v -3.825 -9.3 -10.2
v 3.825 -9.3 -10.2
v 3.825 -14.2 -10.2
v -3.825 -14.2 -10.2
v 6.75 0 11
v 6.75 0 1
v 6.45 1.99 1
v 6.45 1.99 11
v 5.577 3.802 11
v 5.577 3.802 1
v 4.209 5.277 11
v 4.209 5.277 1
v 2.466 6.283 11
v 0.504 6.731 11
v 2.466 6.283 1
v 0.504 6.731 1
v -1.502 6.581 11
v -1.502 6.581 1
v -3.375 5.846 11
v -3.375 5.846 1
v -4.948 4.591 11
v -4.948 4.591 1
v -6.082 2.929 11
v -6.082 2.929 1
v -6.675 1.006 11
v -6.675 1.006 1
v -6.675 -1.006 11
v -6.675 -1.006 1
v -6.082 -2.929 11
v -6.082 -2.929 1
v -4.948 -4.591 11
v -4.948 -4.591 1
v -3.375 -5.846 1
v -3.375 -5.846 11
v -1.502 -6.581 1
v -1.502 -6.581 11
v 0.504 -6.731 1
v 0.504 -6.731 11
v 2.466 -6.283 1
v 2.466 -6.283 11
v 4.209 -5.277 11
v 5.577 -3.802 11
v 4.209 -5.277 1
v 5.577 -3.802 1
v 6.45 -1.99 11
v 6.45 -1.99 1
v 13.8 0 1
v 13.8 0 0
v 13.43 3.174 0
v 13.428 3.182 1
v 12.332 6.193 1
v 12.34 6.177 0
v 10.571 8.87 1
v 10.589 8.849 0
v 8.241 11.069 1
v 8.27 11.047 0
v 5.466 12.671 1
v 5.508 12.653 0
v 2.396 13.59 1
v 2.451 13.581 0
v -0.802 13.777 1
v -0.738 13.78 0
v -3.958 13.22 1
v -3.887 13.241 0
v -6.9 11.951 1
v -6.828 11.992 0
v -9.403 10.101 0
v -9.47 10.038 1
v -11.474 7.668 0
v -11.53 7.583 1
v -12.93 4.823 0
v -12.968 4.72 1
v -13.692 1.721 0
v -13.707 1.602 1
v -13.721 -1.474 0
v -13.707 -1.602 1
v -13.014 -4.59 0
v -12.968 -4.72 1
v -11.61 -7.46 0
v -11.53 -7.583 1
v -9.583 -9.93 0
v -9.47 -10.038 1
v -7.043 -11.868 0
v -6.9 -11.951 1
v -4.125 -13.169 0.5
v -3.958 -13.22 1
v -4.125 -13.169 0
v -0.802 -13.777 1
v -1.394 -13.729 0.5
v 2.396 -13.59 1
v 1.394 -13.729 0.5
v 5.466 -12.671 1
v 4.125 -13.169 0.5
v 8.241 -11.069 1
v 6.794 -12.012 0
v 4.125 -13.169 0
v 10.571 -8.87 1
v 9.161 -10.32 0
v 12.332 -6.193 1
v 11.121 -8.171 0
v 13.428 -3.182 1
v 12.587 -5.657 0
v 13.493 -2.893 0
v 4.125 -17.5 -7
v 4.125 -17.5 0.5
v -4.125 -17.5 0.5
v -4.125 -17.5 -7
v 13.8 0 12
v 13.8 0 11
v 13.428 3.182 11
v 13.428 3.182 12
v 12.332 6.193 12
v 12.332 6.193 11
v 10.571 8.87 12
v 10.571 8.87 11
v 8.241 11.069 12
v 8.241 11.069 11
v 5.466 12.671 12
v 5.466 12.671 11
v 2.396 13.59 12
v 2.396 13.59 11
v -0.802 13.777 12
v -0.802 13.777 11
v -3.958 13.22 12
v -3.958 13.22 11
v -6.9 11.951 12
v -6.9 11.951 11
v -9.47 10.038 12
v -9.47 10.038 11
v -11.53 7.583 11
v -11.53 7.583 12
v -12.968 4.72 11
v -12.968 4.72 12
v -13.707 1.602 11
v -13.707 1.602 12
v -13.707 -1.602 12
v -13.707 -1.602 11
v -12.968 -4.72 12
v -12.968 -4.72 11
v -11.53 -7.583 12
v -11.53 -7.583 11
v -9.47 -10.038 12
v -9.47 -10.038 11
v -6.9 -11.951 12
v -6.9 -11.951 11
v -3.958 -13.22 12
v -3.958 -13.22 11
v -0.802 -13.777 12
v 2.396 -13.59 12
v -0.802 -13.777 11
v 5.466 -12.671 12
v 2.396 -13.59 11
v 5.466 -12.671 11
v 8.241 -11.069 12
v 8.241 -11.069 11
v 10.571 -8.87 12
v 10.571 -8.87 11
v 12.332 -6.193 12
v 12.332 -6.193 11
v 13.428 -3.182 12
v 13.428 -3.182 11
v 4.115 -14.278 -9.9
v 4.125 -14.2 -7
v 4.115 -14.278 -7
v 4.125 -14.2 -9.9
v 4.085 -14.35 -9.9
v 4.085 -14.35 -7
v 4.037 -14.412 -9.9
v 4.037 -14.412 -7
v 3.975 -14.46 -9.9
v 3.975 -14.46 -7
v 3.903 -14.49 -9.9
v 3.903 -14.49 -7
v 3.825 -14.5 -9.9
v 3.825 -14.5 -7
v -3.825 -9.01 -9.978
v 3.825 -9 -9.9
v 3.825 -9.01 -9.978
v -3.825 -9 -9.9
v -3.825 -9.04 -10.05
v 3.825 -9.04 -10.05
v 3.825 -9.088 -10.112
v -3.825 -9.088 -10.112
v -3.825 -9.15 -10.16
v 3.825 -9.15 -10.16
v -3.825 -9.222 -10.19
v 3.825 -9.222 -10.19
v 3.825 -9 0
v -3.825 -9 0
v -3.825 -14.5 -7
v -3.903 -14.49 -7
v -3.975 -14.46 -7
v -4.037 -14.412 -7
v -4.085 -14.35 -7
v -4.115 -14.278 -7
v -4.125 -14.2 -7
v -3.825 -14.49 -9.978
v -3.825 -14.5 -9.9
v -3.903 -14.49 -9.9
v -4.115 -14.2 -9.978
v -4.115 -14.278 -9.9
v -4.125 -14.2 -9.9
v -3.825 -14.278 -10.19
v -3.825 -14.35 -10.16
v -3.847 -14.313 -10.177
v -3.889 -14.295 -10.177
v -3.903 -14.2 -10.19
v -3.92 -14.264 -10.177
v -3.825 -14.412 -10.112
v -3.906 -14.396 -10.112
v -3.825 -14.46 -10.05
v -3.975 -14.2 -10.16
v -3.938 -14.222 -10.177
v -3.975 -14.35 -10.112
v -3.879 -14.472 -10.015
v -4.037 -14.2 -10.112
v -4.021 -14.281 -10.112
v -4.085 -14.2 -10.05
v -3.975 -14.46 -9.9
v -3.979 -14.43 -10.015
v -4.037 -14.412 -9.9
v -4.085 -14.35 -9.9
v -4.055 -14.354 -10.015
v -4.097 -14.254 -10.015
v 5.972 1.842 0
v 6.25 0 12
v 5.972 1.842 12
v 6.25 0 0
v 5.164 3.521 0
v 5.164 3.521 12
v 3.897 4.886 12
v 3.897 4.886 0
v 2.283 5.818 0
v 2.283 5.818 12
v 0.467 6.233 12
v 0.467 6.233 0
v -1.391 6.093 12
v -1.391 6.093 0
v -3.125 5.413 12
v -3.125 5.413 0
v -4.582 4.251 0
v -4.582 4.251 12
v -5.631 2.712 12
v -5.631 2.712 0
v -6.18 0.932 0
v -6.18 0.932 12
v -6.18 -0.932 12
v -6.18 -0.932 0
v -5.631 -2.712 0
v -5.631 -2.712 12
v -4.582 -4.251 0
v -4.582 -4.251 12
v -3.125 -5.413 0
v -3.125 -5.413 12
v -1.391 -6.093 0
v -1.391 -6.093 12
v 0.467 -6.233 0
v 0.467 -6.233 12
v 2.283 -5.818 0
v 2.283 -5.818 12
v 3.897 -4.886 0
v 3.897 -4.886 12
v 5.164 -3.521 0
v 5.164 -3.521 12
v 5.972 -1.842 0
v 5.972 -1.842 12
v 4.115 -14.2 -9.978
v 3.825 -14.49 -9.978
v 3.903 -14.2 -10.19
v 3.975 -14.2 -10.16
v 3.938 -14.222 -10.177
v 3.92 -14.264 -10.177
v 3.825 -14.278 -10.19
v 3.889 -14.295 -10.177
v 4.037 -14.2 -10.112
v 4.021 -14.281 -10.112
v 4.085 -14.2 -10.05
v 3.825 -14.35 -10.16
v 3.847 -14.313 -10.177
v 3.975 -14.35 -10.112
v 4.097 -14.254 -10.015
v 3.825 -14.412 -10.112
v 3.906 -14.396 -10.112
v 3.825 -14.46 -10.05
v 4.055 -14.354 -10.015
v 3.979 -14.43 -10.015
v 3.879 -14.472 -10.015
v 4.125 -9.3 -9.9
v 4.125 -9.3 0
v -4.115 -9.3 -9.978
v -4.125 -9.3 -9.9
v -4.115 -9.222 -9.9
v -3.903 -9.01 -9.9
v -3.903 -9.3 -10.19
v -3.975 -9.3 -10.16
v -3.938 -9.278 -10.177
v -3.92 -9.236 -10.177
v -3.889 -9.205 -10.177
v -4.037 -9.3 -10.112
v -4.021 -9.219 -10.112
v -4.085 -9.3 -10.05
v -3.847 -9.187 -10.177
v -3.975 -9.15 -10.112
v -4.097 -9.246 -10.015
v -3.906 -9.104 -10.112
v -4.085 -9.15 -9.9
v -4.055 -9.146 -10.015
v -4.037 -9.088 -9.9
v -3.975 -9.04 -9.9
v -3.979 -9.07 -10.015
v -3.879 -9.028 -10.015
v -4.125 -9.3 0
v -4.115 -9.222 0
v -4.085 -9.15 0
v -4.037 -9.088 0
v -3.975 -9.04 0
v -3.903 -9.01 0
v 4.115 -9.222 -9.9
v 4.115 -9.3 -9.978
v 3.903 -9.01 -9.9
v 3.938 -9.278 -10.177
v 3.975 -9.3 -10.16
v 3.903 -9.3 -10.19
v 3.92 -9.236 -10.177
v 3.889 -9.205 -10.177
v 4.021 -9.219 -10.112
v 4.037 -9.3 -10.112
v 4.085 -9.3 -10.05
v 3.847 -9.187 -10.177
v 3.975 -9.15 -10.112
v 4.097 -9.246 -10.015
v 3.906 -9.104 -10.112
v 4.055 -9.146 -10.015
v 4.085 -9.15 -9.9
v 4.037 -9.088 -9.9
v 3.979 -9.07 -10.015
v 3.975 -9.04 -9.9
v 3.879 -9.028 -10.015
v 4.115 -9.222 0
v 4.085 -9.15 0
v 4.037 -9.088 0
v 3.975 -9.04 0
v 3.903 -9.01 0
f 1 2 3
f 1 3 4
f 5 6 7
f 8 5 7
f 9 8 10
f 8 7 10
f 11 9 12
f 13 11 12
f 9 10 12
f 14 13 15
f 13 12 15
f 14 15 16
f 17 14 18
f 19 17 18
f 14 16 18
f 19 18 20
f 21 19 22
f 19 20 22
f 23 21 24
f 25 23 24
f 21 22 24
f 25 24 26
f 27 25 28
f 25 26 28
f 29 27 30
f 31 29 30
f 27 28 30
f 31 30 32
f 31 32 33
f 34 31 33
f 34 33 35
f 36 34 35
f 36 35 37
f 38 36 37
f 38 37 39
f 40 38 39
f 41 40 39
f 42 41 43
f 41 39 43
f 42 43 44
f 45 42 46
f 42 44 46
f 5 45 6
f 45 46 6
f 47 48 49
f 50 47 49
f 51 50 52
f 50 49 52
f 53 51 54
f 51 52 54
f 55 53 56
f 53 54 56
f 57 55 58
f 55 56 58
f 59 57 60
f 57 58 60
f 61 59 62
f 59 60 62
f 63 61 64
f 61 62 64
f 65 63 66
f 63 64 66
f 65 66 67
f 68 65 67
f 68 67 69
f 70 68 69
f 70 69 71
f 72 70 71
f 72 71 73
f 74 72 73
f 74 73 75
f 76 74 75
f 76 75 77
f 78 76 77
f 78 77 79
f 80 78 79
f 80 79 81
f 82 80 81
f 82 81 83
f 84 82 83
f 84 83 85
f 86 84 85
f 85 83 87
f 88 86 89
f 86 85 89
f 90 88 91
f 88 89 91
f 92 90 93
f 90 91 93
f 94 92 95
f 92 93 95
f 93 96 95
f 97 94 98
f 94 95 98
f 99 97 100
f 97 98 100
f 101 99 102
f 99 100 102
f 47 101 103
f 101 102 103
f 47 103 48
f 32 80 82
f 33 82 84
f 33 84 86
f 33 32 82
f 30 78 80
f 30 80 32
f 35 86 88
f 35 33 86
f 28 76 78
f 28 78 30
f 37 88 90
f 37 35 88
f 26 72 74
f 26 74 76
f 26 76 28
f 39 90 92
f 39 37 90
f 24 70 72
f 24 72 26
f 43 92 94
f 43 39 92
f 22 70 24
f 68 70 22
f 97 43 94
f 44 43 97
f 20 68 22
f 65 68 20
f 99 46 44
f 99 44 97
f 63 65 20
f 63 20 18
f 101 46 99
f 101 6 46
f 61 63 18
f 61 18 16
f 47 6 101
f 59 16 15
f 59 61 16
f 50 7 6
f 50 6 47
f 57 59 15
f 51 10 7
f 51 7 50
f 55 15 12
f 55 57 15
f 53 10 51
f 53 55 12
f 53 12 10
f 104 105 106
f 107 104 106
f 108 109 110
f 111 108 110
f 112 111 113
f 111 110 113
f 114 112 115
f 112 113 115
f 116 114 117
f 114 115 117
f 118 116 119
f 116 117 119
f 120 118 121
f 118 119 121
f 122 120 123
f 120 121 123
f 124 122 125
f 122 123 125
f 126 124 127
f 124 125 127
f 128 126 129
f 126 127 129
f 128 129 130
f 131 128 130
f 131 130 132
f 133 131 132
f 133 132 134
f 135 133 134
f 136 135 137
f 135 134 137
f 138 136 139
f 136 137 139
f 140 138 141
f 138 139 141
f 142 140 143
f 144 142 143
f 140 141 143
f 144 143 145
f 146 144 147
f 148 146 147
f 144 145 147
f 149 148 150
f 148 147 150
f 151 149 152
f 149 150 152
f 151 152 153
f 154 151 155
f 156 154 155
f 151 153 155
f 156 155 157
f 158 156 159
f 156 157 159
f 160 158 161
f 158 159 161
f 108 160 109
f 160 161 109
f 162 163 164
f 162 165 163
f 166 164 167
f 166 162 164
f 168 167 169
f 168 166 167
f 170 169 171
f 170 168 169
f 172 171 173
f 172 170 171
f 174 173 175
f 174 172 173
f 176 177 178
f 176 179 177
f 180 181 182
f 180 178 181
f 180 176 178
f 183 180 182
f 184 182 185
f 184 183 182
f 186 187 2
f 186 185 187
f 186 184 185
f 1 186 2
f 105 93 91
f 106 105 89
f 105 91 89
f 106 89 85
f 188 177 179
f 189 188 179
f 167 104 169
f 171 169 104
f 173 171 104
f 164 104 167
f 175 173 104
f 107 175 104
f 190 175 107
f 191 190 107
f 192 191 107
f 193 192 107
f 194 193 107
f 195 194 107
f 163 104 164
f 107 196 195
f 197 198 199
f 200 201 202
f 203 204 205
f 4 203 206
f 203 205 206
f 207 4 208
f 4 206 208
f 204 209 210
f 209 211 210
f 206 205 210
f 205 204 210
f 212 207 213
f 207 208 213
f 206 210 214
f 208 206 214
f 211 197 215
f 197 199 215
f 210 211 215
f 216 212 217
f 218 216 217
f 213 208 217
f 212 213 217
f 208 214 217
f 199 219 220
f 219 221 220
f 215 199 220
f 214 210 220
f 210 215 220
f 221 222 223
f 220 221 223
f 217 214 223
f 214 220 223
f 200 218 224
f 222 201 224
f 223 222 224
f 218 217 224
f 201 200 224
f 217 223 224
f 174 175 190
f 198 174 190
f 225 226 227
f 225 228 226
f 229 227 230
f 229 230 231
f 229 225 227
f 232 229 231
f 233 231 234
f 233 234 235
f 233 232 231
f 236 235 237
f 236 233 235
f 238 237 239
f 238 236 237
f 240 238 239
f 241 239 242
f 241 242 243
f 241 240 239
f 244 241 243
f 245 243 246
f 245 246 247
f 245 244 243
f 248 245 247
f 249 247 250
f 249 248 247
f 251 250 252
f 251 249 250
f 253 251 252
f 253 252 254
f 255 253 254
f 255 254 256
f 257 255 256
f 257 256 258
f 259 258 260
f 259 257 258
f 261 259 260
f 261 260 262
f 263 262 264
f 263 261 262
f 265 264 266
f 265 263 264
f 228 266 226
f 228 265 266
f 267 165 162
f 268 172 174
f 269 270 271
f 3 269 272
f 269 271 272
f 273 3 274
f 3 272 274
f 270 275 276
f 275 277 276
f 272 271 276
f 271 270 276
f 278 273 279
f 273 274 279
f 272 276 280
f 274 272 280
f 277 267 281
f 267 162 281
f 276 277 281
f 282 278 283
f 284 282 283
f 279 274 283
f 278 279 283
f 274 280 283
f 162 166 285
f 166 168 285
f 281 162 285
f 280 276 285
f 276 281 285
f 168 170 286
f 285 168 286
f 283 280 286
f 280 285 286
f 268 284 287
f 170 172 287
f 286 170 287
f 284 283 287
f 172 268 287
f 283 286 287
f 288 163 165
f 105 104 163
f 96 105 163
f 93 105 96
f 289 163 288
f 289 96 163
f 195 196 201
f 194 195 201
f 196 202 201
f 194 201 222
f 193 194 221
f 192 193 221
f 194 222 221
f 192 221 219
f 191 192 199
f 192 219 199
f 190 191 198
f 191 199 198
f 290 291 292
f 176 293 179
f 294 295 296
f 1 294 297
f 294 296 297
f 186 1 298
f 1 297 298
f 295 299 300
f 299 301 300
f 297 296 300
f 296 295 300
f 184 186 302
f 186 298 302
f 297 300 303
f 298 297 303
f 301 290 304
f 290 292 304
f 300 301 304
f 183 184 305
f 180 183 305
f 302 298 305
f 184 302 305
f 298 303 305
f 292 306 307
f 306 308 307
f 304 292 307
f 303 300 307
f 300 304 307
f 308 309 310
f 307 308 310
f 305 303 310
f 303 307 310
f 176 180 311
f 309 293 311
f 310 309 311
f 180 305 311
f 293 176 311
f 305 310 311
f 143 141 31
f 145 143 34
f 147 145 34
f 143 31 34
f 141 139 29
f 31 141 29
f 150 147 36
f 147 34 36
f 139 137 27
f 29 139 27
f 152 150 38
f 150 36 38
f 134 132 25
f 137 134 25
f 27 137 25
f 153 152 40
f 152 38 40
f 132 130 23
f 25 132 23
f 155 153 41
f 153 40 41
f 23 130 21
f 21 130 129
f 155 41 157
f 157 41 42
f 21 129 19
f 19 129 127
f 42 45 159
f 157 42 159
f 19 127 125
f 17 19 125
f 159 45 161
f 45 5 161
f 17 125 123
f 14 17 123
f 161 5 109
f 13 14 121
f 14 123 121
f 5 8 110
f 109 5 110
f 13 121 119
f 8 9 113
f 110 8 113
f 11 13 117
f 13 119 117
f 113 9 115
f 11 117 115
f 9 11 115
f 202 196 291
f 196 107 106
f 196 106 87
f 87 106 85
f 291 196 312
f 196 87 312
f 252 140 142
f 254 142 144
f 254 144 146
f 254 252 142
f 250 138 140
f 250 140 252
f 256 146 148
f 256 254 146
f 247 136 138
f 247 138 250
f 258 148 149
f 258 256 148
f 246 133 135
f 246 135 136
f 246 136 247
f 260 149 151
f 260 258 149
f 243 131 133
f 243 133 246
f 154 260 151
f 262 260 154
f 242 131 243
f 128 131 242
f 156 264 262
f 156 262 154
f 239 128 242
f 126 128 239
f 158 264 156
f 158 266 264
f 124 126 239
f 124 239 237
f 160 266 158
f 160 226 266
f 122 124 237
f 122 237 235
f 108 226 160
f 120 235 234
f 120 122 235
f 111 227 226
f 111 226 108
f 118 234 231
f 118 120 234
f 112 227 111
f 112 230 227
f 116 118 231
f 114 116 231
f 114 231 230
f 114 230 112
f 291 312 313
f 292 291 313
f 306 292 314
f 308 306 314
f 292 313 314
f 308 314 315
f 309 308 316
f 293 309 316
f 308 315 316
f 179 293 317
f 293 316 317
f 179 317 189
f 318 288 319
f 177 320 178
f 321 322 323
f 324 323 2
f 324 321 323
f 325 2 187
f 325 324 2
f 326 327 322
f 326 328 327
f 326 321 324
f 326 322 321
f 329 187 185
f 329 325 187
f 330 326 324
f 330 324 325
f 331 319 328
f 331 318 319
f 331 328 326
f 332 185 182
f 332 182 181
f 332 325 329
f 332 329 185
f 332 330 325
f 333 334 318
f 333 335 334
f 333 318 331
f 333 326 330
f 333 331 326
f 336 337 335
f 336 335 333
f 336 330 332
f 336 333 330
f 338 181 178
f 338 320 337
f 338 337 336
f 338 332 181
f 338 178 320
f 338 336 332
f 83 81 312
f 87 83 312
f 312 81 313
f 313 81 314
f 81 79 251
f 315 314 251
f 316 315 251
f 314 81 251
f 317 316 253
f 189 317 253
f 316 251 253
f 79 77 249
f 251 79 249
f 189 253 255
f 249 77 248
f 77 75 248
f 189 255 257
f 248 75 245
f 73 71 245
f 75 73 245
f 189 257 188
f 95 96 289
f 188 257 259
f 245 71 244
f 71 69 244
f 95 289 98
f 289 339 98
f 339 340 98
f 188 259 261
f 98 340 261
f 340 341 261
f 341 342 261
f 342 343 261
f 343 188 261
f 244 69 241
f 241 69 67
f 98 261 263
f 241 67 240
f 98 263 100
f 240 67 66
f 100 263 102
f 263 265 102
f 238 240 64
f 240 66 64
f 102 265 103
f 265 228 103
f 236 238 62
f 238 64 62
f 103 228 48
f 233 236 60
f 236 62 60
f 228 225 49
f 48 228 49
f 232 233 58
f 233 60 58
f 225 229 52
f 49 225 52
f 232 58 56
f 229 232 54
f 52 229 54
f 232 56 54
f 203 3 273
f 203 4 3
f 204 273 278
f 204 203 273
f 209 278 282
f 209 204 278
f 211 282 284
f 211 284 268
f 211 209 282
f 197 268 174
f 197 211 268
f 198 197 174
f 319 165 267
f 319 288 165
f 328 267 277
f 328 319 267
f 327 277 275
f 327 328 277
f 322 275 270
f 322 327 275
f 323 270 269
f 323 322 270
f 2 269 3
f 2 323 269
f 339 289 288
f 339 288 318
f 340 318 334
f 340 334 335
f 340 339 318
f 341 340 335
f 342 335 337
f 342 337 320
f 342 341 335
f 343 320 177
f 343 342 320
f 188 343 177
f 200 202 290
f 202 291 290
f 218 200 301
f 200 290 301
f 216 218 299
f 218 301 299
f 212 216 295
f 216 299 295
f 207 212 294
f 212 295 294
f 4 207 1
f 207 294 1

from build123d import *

# Parameters (mm, degrees)
SKETCH_1_R           = 13.8
SKETCH_1_R_2         = 6.25
EXTRUDE_1_DEPTH      = 1
SKETCH_2_R           = 6.75
SKETCH_2_R_2         = 6.25
EXTRUDE_2_DEPTH      = 10
SKETCH_3_R           = 13.8
SKETCH_3_R_2         = 6.25
EXTRUDE_3_DEPTH      = 1
EXTRUDE_4_DEPTH      = 7
EXTRUDE_4_DEPTH_BACK = 0.5
SKETCH_4_W           = 8.25
SKETCH_4_H           = 8.5
SKETCH_5_W           = 8.25
SKETCH_5_H           = 5.5
EXTRUDE_5_DEPTH      = 3.2
FILLET_1_R           = 0.3


with BuildPart() as part:
    # Эскиз1 → Бобышка-Вытянуть1 (new body)
    with BuildSketch(Plane.XY):
        Circle(SKETCH_1_R)
        Circle(SKETCH_1_R_2, mode=Mode.SUBTRACT)
    extrude(amount=EXTRUDE_1_DEPTH)

    # Эскиз2 → Бобышка-Вытянуть2 (add)
    with BuildSketch(Plane.XY.offset(1)):
        Circle(SKETCH_2_R)
        Circle(SKETCH_2_R_2, mode=Mode.SUBTRACT)
    extrude(amount=EXTRUDE_2_DEPTH)

    # Эскиз3 → Бобышка-Вытянуть3 (add)
    with BuildSketch(Plane.XY.offset(11)):
        Circle(SKETCH_3_R)
        Circle(SKETCH_3_R_2, mode=Mode.SUBTRACT)
    extrude(amount=EXTRUDE_3_DEPTH)

    # Эскиз4 → Бобышка-Вытянуть4 (add, two sides: drawn at the far end of the back side and taken through both)
    with BuildSketch(Plane(origin=(0, 0, 0), x_dir=(-1, 0, 0), z_dir=(0, 0, -1)).offset(-EXTRUDE_4_DEPTH_BACK)):
        with Locations((0, -13.25)):
            Rectangle(SKETCH_4_W, SKETCH_4_H)
    extrude(amount=EXTRUDE_4_DEPTH + EXTRUDE_4_DEPTH_BACK)

    # Эскиз5 → Бобышка-Вытянуть5 (add)
    with BuildSketch(Plane(origin=(0, 0, -7), x_dir=(-1, 0, 0), z_dir=(0, 0, -1))):
        with Locations((0, -11.75)):
            Rectangle(SKETCH_5_W, SKETCH_5_H)
    extrude(amount=EXTRUDE_5_DEPTH)

    # Скругление1
    fillet_1_edges = [part.edges().sort_by_distance(p)[0] for p in [
        (4.125, -9, -5.1),
        (-4.125, -9, -5.1),
        (4.125, -14.5, -8.6),
        (-4.125, -14.5, -8.6),
        (4.125, -11.75, -10.2),
        (0, -14.5, -10.2),
        (-4.125, -11.75, -10.2),
        (0, -9, -10.2),
    ]]
    fillet(fillet_1_edges, radius=FILLET_1_R)


solid = part.part
